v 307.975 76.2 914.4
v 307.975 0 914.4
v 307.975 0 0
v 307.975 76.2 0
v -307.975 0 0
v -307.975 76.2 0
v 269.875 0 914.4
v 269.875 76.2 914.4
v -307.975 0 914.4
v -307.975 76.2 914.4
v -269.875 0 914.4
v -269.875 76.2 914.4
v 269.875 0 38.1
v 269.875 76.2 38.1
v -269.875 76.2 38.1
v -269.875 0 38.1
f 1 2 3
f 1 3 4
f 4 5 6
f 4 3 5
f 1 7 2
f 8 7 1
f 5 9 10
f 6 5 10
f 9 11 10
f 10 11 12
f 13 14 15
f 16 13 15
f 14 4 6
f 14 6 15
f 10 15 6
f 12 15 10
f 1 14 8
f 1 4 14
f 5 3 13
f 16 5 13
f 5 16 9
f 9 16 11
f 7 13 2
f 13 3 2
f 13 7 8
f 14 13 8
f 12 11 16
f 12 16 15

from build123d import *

# Parameters (mm, degrees)
F0_W     = 269.875
F0_H     = 76.2
F1_DEPTH = 38.1
F2_W     = 76.2
F2_H     = 914.4
F3_DEPTH = 38.1


with BuildPart() as f1:
    # F0 (on Top) → F1 (new body)
    with BuildSketch(Plane.XY):
        with Locations((134.9375, 38.1)):
            Rectangle(F0_W, F0_H)
    extrude(amount=F1_DEPTH)

    # F2 (on face) → F3 (join)
    with BuildSketch(Plane.YZ.offset(269.875)):
        with Locations((38.1, 457.2)):
            Rectangle(F2_W, F2_H)
    extrude(amount=F3_DEPTH)

    # F4: F1 across plane


with BuildPart() as f1_1:
    add(f1.part)
    add(f1.part.mirror(Plane.YZ))


solid = f1_1.part
